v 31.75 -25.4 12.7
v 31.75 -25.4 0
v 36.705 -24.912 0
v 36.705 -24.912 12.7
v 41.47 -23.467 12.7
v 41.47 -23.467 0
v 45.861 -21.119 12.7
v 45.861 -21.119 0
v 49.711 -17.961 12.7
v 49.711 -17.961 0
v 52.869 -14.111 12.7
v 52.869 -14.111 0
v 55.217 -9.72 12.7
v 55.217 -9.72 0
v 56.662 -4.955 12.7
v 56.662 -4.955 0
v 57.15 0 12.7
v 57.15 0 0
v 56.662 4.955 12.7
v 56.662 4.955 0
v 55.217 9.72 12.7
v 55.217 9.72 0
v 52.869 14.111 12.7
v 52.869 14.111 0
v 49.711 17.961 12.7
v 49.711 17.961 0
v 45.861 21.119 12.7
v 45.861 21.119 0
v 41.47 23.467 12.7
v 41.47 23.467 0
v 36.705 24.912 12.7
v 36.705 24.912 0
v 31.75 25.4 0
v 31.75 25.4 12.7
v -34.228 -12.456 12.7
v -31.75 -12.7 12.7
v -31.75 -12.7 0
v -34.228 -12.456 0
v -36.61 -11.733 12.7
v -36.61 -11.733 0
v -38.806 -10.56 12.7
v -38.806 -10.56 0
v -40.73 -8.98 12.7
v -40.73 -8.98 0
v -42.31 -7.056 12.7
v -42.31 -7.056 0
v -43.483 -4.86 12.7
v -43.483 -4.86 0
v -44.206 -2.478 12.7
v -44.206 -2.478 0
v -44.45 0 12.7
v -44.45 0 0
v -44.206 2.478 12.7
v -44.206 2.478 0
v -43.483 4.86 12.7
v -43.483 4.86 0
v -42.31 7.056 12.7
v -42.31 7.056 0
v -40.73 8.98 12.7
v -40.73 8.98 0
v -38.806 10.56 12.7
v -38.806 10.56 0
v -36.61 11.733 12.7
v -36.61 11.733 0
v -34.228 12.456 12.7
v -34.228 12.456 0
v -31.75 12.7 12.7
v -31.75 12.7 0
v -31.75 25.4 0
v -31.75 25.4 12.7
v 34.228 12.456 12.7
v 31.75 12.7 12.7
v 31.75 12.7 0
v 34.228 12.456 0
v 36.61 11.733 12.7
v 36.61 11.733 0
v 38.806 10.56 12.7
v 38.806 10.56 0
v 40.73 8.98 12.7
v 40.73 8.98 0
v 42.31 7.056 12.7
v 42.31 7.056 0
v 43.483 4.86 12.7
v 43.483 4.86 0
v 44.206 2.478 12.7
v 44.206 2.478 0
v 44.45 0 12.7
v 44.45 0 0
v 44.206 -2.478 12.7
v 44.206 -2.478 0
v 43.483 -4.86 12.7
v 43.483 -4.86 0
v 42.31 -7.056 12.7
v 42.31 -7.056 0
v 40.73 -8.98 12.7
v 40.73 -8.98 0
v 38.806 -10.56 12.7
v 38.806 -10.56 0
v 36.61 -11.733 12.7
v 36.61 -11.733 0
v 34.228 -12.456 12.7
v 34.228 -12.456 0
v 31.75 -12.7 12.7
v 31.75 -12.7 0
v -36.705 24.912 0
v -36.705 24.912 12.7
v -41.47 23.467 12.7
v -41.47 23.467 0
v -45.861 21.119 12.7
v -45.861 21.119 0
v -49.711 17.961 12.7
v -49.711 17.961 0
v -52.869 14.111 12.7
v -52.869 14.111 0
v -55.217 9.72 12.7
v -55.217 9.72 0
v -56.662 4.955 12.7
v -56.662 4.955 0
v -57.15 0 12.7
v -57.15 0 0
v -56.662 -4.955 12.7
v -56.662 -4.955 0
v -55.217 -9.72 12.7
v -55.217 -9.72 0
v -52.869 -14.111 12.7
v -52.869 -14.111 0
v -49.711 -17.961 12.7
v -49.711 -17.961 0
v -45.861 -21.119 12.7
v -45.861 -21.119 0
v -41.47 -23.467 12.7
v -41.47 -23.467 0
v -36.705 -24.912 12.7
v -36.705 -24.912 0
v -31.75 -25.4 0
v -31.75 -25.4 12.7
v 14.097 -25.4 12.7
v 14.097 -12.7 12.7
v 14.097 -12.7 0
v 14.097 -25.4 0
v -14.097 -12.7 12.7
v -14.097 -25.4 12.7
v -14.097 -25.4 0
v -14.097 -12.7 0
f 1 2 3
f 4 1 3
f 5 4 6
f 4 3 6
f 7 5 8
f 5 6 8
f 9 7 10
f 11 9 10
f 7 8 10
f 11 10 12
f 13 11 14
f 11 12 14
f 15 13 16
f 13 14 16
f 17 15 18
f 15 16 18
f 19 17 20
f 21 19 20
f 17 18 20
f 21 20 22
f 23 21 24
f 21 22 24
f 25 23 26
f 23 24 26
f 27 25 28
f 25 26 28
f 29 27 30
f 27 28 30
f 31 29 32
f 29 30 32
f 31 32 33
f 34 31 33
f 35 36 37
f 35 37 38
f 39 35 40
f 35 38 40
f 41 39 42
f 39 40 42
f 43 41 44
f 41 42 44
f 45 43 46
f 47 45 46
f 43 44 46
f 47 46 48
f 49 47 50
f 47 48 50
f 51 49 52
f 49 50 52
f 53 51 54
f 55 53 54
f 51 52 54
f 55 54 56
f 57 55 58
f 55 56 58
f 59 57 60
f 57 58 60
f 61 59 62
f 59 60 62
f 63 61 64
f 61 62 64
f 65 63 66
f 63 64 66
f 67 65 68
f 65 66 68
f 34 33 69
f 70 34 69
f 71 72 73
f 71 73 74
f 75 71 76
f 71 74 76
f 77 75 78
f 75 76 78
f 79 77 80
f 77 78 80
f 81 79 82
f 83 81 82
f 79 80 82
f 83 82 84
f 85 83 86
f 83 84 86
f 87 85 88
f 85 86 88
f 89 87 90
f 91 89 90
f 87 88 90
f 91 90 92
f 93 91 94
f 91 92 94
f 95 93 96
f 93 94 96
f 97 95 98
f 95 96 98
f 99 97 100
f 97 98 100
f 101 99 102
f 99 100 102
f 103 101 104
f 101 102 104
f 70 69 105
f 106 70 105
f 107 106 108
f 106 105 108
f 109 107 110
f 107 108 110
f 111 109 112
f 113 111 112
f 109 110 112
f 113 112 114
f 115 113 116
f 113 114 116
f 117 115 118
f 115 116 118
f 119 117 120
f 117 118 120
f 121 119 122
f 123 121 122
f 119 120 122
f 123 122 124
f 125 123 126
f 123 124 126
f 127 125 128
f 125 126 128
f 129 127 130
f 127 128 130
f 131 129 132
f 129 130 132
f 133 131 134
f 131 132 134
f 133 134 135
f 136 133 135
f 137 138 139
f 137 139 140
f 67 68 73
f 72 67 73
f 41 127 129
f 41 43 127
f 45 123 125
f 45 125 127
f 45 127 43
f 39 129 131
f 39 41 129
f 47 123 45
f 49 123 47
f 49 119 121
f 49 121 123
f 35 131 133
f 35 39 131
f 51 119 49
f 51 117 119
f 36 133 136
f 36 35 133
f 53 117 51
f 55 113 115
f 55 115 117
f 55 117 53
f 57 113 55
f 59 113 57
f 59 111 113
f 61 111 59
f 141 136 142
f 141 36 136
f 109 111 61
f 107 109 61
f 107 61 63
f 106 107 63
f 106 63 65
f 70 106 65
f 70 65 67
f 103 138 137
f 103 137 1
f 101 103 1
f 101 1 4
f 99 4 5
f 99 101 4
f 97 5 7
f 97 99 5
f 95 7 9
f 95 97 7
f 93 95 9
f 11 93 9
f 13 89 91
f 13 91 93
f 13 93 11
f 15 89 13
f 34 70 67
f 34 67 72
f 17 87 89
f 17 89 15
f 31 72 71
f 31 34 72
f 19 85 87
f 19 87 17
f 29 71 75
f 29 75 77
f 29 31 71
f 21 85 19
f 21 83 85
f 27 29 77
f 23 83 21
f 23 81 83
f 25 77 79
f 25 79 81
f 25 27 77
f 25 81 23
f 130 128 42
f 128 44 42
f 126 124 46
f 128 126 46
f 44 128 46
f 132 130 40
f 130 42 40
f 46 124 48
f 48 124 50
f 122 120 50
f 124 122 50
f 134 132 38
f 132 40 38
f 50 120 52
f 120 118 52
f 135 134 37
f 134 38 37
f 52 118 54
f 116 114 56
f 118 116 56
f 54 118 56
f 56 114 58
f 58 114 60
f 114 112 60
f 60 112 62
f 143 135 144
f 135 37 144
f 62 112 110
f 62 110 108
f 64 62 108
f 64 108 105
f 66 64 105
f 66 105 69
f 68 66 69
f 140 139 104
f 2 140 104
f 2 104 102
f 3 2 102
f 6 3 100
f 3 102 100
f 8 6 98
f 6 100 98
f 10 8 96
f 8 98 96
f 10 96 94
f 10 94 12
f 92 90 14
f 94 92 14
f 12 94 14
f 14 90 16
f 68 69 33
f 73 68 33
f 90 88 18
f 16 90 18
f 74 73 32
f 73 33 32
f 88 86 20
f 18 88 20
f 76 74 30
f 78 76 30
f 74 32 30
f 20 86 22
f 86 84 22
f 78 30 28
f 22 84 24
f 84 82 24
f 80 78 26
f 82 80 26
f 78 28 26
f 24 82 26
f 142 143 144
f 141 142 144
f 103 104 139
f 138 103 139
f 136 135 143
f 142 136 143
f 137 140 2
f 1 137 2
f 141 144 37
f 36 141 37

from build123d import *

# Parameters (mm, degrees)
F1_DEPTH = 12.7


# Not quite as in the source:
# - a feature of the source that left no trace in its solid (it failed there, or was rolled back) is left out


with BuildPart() as f1:
    # F0 (on Top) → F1 (new body)
    with BuildSketch(Plane.XY):
        with BuildLine():
            ThreePointArc((31.75, 12.7), (44.45, 0), (31.75, -12.7))
            Line((31.75, -12.7), (14.0969706699, -12.7))
            Line((14.0969706699, -12.7), (14.0969706699, -25.4))
            Line((14.0969706699, -25.4), (31.75, -25.4))
            ThreePointArc((31.75, -25.4), (57.15, 0), (31.75, 25.4))
            Line((31.75, 25.4), (0, 25.4))
            Line((0, 25.4), (-31.75, 25.4))
            ThreePointArc((-31.75, 25.4), (-57.15, 0), (-31.75, -25.4))
            Line((-31.75, -25.4), (-14.0969706699, -25.4))
            Line((-14.0969706699, -25.4), (-14.0969706699, -12.7))
            Line((-14.0969706699, -12.7), (-31.75, -12.7))
            ThreePointArc((-31.75, -12.7), (-44.45, 0), (-31.75, 12.7))
            Line((-31.75, 12.7), (0, 12.7))
            Line((0, 12.7), (31.75, 12.7))
        make_face()
    extrude(amount=F1_DEPTH)


solid = f1.part
